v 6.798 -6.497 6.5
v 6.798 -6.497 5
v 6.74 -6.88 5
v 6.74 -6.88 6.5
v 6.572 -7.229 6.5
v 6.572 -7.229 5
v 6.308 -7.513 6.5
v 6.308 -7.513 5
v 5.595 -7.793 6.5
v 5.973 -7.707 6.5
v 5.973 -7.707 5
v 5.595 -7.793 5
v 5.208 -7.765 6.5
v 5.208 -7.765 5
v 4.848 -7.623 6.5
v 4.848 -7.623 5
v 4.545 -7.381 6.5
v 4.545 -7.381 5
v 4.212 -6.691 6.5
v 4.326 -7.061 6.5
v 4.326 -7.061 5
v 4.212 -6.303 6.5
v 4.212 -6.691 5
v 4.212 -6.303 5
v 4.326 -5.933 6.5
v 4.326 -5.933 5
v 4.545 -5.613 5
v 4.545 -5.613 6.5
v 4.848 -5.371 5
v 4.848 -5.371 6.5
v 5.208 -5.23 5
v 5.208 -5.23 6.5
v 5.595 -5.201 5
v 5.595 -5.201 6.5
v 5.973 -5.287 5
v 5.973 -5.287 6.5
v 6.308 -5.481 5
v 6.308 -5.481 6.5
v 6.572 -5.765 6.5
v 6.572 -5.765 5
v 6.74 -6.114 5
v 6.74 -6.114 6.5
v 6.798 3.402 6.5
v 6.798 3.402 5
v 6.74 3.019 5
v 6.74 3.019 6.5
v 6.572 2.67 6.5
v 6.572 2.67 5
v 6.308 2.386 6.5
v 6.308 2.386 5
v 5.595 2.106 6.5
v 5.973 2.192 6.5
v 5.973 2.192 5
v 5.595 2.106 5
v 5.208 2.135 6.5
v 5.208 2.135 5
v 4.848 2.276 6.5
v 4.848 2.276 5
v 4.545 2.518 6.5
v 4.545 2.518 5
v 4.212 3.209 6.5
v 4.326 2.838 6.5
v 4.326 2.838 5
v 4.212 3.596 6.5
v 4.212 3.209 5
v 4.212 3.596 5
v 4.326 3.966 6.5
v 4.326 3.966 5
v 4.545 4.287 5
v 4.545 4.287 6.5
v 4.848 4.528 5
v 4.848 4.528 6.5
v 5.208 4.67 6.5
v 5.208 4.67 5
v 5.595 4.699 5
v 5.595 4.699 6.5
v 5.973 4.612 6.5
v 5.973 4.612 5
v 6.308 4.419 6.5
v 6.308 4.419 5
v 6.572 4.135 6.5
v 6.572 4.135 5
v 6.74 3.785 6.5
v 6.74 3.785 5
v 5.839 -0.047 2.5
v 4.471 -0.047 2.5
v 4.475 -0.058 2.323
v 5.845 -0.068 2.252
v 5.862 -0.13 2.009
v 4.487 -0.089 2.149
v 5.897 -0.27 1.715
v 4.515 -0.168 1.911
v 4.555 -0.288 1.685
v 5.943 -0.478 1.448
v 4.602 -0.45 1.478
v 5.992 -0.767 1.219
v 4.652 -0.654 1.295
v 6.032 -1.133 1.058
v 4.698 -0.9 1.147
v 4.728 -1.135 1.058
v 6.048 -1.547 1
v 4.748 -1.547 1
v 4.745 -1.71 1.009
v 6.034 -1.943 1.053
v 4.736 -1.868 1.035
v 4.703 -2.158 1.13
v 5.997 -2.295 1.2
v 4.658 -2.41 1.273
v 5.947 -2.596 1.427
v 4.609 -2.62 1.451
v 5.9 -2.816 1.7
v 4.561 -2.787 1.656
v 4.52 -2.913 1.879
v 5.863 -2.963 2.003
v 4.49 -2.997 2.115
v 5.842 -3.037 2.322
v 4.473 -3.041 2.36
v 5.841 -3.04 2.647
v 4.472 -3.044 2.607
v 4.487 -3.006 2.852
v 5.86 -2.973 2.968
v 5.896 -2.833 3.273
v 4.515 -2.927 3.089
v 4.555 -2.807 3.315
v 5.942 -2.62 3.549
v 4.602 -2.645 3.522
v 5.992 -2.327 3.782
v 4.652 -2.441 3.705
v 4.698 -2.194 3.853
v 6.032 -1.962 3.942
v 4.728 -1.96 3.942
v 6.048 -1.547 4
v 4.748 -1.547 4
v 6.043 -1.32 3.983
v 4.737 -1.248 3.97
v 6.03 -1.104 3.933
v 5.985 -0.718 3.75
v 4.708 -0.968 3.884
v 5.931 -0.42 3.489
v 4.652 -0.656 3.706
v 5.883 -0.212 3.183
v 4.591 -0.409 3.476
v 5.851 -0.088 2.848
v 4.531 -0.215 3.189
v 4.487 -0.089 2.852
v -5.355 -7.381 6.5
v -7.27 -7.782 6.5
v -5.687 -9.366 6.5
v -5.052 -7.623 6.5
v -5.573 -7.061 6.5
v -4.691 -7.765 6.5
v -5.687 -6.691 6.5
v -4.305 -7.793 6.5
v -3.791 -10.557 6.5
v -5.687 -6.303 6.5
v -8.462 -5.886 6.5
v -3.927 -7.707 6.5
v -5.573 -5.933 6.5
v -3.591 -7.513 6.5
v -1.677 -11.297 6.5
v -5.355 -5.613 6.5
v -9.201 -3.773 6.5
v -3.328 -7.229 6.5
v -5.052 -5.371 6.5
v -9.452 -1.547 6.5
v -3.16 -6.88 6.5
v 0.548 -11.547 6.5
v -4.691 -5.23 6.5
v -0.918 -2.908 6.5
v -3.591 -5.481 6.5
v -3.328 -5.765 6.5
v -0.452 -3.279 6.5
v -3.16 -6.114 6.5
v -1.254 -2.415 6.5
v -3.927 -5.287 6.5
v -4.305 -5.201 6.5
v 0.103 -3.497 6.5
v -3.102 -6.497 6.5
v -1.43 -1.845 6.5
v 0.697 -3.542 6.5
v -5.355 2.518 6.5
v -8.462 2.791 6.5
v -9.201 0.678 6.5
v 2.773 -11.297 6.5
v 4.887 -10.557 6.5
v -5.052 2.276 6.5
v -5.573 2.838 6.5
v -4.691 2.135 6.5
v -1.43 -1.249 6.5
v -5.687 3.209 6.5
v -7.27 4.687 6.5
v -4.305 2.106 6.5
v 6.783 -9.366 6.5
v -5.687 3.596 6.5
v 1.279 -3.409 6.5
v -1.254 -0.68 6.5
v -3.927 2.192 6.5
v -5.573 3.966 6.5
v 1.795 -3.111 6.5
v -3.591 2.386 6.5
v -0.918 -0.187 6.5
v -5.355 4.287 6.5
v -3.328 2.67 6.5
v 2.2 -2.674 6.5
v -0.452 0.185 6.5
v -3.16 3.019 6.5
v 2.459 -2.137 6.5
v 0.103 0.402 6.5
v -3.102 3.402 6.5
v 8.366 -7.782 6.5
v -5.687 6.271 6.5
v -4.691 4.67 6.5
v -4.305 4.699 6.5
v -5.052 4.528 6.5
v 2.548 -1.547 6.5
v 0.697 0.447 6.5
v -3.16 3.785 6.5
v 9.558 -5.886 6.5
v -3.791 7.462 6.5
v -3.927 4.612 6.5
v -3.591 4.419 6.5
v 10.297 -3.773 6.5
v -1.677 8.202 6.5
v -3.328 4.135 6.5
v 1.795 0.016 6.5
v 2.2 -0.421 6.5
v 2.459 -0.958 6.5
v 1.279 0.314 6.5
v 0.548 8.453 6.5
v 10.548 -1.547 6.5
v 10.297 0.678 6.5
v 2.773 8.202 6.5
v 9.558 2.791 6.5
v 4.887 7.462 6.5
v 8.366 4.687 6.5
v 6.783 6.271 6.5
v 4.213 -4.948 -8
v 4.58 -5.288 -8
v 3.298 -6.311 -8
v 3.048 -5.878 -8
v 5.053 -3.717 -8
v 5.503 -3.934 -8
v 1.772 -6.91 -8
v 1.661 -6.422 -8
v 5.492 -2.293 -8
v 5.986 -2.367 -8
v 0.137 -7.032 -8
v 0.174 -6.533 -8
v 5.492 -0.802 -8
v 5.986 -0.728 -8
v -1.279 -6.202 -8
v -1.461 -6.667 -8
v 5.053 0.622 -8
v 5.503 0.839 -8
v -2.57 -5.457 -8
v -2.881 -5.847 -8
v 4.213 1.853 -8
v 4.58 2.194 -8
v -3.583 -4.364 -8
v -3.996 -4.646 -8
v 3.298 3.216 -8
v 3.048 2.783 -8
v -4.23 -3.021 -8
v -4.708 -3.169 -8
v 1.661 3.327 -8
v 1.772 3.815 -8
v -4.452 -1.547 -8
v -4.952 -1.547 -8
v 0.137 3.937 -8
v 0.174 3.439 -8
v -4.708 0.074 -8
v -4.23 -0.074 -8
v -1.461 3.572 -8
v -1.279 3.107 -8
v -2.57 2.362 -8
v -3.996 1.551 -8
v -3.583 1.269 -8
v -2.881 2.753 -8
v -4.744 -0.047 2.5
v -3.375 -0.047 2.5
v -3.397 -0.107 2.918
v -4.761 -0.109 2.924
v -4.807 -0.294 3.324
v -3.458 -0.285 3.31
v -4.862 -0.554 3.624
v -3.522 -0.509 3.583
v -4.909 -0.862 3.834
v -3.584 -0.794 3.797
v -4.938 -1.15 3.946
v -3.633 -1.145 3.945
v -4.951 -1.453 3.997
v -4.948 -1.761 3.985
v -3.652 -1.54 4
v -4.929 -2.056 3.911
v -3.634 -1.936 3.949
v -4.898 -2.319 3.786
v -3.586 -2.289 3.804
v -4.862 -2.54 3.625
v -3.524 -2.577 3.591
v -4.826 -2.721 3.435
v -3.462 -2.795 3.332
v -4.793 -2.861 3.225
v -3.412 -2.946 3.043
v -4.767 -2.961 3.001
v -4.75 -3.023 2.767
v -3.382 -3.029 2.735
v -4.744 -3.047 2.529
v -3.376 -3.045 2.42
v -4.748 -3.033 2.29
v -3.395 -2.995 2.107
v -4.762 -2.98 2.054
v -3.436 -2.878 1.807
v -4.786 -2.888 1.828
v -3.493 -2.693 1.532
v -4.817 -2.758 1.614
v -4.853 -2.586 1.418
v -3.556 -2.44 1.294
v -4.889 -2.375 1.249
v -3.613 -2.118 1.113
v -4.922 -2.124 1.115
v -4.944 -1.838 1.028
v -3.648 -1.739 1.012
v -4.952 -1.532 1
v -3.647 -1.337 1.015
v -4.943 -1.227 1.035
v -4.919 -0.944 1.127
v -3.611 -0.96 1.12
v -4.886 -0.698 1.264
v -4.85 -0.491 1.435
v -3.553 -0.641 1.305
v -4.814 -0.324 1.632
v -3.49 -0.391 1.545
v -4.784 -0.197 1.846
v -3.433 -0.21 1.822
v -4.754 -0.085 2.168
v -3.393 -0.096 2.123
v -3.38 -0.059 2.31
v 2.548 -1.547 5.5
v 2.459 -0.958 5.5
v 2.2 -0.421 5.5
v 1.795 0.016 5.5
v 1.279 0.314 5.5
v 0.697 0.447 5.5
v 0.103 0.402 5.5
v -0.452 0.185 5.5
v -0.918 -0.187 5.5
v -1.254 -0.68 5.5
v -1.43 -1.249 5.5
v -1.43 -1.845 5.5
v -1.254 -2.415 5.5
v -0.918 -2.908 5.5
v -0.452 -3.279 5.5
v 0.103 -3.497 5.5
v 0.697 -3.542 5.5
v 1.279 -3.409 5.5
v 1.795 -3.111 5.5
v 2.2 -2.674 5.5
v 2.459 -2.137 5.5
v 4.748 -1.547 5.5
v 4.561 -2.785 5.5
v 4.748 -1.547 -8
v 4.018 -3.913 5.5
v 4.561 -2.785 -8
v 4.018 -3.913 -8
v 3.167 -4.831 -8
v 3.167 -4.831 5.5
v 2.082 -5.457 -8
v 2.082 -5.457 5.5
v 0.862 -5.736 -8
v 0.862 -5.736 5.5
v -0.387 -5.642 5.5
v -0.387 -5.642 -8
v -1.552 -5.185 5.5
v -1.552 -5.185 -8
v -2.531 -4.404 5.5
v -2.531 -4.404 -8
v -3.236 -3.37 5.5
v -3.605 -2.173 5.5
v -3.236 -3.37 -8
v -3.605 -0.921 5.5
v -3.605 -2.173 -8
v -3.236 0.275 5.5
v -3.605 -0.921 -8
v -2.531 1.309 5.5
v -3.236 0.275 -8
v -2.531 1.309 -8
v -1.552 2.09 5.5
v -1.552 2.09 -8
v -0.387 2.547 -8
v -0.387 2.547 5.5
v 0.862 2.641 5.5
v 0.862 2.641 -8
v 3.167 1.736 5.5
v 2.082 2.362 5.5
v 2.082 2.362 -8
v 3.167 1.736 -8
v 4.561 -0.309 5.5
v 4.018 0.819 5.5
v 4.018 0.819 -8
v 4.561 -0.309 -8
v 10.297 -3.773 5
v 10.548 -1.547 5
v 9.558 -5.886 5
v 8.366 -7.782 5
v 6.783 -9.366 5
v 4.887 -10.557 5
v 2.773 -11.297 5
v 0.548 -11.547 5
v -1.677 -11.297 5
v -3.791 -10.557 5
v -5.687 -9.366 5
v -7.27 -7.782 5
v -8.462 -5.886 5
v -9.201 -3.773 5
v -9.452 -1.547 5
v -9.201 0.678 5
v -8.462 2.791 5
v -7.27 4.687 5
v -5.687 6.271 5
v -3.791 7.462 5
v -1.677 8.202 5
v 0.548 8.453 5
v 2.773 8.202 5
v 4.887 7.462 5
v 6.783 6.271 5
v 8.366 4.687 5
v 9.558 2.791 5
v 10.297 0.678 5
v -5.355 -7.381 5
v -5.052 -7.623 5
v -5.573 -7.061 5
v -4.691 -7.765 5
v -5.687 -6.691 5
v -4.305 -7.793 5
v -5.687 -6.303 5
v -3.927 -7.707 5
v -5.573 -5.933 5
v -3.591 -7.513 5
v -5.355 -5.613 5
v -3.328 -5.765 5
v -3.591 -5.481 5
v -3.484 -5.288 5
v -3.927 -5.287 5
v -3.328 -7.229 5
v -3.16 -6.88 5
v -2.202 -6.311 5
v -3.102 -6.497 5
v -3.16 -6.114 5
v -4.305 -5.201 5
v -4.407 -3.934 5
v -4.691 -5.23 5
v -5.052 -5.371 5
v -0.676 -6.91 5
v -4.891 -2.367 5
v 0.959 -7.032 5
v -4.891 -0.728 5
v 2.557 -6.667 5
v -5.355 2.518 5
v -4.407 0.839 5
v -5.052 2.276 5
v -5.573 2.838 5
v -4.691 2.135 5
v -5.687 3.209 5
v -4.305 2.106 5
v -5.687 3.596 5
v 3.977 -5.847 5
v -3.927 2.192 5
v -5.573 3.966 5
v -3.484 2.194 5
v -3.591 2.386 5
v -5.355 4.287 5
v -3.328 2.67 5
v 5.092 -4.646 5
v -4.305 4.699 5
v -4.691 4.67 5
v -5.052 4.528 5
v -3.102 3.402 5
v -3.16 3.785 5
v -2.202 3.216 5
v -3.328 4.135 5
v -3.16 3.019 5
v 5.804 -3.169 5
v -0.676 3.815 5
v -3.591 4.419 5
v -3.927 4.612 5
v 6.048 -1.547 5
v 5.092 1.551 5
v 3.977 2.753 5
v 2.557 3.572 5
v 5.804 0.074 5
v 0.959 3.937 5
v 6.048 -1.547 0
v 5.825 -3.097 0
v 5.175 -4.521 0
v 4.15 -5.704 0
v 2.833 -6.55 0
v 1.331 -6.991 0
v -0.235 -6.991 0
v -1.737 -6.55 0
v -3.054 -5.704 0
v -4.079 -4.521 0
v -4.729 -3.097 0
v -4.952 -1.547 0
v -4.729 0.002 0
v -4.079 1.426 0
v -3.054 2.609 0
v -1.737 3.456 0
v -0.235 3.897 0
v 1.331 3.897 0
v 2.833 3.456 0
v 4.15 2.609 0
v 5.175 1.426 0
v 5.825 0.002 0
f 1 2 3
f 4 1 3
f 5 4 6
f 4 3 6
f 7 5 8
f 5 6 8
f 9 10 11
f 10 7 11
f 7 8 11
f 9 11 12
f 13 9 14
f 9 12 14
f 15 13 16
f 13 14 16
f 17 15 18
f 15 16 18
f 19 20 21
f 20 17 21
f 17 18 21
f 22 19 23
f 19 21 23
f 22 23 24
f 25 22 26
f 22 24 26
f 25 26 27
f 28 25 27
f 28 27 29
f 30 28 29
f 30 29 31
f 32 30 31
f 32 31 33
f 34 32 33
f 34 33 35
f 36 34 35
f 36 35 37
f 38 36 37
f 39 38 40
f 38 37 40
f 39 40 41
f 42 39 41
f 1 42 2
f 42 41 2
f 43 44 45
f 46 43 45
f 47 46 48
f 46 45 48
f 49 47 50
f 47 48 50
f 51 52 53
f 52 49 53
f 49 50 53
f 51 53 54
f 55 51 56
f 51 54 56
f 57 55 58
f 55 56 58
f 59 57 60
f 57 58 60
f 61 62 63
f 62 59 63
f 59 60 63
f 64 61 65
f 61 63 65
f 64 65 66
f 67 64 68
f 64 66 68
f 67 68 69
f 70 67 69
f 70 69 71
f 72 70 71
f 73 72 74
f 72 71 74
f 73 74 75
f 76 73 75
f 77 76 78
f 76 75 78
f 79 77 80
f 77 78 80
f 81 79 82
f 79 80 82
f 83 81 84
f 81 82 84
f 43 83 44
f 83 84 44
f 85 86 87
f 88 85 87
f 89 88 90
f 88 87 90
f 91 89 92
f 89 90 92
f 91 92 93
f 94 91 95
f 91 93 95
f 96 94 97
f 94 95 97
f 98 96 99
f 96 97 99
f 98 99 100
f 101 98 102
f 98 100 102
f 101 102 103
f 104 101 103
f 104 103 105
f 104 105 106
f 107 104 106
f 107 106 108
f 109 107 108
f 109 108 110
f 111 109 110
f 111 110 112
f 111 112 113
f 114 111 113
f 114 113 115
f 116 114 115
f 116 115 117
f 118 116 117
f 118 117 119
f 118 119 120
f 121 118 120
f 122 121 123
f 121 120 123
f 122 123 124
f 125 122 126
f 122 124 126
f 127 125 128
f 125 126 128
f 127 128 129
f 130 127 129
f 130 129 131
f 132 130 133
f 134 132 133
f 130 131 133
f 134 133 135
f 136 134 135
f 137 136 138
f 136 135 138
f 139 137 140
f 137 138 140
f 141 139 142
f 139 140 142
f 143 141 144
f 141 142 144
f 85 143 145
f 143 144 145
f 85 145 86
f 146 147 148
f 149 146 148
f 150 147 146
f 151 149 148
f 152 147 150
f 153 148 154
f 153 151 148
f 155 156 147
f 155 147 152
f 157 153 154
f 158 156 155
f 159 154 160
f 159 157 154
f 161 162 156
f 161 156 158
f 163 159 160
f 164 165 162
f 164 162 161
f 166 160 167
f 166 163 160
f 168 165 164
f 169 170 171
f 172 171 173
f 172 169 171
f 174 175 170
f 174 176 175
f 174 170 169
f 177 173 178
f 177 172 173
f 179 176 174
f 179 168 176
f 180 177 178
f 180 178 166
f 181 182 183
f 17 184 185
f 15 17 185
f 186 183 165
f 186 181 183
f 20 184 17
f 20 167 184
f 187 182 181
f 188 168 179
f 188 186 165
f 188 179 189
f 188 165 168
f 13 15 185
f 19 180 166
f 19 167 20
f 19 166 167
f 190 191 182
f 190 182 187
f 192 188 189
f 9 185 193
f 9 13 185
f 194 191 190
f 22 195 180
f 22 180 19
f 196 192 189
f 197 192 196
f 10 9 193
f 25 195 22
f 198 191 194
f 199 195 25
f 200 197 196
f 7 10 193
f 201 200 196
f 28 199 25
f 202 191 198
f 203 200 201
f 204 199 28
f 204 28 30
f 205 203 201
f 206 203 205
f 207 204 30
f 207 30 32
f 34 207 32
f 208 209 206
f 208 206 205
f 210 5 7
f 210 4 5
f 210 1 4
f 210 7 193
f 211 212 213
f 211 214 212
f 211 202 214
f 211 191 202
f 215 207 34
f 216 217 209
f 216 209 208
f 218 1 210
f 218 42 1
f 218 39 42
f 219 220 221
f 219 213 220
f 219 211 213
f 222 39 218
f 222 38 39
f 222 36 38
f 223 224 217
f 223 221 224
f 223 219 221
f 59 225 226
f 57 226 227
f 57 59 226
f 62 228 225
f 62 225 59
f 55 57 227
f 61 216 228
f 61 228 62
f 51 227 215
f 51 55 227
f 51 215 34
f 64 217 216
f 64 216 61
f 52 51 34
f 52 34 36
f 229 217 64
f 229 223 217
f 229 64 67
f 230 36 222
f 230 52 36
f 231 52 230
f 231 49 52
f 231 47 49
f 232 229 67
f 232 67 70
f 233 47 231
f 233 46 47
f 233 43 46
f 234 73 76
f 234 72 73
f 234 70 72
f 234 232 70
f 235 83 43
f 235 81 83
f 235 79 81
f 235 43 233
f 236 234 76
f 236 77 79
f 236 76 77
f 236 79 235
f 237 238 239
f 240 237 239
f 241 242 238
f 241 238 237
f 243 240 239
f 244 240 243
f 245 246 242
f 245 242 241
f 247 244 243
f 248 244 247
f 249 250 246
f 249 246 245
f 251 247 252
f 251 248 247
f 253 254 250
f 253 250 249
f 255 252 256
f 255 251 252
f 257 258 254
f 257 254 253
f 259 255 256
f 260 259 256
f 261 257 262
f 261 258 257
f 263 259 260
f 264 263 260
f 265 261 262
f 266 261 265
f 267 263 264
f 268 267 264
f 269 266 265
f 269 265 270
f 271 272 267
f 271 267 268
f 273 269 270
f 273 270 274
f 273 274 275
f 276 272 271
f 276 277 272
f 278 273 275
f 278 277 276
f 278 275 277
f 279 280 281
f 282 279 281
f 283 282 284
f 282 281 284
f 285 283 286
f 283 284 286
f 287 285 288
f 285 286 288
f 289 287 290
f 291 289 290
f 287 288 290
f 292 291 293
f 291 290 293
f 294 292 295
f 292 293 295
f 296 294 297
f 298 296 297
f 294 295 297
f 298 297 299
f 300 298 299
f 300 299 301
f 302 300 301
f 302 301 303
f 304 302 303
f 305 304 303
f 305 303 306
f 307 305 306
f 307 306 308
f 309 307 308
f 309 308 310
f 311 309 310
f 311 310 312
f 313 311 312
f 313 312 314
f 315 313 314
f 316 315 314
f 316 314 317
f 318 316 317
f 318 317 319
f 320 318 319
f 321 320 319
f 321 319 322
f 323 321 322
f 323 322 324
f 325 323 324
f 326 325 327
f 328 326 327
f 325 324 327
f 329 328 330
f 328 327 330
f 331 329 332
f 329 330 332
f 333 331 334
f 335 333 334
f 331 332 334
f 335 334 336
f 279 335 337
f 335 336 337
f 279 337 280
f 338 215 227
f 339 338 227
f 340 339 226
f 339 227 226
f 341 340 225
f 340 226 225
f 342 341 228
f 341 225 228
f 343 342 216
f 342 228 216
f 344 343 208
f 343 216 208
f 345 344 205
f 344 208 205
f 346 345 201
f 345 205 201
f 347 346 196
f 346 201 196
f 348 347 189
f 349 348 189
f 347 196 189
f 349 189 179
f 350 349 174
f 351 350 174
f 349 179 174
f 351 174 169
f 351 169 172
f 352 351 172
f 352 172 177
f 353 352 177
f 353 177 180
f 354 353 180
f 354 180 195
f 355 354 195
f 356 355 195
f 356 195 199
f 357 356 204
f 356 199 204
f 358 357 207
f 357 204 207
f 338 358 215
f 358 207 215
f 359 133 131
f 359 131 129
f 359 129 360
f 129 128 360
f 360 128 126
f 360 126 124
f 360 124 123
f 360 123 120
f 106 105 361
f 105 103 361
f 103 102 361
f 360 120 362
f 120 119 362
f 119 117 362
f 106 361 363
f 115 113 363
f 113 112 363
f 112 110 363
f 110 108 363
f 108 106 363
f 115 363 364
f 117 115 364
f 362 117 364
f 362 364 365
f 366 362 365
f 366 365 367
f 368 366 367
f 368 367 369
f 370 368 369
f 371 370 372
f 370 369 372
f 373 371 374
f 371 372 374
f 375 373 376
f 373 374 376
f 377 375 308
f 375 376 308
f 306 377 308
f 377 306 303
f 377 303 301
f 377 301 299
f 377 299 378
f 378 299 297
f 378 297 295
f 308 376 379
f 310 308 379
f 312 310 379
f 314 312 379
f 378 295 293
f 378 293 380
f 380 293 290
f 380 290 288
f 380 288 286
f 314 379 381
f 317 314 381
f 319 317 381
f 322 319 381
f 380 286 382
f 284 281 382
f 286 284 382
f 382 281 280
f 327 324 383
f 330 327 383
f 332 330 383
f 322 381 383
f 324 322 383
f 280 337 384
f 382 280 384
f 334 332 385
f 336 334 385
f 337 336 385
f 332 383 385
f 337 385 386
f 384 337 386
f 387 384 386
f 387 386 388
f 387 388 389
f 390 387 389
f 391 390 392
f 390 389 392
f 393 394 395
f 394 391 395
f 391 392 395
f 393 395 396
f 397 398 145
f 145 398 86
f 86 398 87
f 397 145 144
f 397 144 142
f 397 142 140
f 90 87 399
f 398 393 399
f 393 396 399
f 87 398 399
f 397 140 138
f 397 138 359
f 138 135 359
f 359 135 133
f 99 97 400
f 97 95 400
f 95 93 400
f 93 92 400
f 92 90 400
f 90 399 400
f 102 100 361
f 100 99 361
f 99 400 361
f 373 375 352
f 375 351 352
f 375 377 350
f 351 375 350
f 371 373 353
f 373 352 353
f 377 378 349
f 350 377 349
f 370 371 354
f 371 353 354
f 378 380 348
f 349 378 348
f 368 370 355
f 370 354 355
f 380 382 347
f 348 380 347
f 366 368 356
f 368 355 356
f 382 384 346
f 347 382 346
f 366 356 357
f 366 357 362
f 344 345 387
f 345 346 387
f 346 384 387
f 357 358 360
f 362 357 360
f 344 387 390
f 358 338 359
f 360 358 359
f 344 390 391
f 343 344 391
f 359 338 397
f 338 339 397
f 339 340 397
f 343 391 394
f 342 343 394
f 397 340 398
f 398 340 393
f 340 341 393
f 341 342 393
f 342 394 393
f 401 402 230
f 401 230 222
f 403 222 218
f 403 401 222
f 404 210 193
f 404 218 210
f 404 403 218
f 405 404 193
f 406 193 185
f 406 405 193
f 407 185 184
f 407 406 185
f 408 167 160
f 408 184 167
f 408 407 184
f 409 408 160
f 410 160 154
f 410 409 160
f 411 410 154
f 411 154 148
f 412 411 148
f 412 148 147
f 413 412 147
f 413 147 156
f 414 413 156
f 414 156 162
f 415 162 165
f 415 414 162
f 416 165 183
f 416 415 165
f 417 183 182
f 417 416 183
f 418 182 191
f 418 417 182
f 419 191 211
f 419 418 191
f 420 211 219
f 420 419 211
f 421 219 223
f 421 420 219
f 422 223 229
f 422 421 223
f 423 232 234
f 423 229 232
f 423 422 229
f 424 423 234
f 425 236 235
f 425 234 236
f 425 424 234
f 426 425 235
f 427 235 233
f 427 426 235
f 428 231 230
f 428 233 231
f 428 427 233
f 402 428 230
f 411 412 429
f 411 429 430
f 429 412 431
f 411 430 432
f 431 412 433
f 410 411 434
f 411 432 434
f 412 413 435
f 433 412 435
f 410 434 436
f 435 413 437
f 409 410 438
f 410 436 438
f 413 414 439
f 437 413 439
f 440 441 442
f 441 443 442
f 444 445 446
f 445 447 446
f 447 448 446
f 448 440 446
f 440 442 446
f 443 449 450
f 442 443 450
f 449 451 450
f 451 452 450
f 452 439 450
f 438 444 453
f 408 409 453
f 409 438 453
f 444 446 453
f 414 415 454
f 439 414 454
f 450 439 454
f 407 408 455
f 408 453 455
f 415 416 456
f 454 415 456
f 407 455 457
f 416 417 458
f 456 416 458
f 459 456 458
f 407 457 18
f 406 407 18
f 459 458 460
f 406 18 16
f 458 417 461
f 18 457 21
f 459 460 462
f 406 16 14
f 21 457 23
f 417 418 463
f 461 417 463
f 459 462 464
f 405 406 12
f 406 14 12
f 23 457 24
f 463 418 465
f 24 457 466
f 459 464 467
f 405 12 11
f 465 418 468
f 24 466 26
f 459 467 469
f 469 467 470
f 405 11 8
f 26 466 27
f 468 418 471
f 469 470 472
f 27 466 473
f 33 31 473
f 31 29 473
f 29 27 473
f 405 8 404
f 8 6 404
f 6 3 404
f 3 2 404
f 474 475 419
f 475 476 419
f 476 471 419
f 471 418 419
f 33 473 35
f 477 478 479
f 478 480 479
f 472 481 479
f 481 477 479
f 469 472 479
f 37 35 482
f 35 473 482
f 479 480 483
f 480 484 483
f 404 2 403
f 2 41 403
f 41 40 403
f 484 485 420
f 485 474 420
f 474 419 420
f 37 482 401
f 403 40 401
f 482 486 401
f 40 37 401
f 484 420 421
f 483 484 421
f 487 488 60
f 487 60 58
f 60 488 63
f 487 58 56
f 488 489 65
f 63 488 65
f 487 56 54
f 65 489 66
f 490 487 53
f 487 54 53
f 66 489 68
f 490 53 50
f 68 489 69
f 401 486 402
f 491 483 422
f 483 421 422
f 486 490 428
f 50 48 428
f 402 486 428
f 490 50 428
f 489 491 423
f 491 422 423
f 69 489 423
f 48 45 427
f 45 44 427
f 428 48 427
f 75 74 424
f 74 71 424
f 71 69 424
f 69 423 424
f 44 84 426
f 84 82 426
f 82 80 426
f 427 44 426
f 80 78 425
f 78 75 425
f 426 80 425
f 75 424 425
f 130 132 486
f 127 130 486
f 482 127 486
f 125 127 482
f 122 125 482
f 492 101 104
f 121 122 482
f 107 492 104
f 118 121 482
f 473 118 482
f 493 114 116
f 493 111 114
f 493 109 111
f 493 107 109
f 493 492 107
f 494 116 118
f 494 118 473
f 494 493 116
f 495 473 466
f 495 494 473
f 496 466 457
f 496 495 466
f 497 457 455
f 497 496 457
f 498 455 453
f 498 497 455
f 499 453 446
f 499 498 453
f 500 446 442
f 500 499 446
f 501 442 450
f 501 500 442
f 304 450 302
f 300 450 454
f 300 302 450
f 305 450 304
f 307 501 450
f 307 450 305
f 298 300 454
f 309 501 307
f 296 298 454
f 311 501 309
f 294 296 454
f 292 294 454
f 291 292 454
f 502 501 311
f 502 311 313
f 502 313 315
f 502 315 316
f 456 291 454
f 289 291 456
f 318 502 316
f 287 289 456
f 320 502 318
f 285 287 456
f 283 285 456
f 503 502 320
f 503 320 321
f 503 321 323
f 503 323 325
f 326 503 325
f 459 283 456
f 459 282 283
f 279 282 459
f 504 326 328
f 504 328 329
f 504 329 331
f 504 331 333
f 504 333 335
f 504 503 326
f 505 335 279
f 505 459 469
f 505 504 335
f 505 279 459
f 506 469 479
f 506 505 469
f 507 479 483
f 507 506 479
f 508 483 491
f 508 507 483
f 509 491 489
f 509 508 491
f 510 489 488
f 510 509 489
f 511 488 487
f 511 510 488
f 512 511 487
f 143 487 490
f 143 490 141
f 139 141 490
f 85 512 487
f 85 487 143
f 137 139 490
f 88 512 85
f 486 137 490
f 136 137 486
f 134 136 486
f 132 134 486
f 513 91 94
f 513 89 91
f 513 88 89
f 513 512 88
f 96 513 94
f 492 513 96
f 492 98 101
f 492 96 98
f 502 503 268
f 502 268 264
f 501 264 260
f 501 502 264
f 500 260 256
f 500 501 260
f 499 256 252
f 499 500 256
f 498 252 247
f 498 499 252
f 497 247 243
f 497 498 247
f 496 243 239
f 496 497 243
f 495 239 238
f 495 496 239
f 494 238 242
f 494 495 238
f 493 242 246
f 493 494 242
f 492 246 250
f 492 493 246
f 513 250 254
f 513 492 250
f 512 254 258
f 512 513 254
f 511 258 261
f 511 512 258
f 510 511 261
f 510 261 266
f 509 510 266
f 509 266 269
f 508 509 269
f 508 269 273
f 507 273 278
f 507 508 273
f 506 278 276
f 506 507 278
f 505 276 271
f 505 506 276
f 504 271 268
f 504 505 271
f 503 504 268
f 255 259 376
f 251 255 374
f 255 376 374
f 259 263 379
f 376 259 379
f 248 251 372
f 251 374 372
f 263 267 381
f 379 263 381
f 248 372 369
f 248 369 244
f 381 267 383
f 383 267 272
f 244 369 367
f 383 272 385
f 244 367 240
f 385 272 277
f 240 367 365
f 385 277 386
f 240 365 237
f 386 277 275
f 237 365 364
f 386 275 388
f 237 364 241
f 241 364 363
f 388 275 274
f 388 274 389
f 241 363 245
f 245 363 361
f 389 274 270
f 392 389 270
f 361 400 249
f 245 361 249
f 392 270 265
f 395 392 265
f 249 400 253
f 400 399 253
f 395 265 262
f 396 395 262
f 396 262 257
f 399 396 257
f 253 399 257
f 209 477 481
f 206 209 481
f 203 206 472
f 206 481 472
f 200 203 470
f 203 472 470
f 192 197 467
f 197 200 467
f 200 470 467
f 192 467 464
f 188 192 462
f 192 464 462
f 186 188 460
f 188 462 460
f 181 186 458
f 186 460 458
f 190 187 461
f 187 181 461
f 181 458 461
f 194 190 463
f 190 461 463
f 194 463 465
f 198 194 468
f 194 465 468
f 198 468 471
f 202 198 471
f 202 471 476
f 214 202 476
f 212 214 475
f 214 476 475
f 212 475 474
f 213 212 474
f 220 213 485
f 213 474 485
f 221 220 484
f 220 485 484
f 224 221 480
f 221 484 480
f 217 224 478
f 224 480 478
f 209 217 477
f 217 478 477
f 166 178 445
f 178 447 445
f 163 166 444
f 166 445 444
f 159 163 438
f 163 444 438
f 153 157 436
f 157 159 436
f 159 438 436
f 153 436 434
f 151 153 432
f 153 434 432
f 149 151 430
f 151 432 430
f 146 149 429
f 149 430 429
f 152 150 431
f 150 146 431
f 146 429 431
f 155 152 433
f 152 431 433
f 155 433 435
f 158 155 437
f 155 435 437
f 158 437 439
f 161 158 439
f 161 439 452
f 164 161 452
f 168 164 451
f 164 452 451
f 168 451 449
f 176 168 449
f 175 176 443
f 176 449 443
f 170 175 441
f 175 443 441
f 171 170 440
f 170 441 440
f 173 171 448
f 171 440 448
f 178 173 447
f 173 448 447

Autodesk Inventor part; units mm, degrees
ref_plane "YZ Plane" through (0, 0, 0) normal (1, 0, 0) x (0, 1, 0)
ref_plane "XZ Plane" through (0, 0, 0) normal (0, 1, 0) x (-1, 0, 0)
ref_plane "XY Plane" through (0, 0, 0) normal (0, 0, 1) x (1, 0, 0)
sketch "스케치1" plane through (0, 0, 0) normal (0, 0, 1) x (1, 0, 0)
  circle A0 centre (0.5479, -1.5474) radius 5.5
  circle A1 centre (0.5479, -1.5474) radius 5
  circle A2 centre (0.5479, -1.5474) radius 4.2
  ellipse E0 centre (0.5479, -1.5474) end of major axis (-0.0909, -9.0201) minor radius 7.4992
  ellipse E1 centre (0.5479, -1.5474) end of major axis (-0.0912, -9.0201) minor radius 7.4991
  ellipse E2 centre (0.5479, -1.5474) end of major axis (1.2999, 2.3813) minor radius 3.9993 (-3.4513, -1.5143) -> (4.5471, -1.5804) ccw projected
  dimension "d0" = 10
  dimension "d1" = 8.4
  dimension "d24" = 11
extrude "돌출1" add sketch "스케치1" against normal blind 8 contours A1
sketch "스케치2" plane through (0.5479, -1.5474, 0) normal (0, 0, 1) x (1, 0, 0)
  circle A0 centre (0, 0) radius 4.2 projected
  circle A1 centre (0, 0) radius 5.5
  dimension "d4" = 11
extrude "돌출2" add sketch "스케치2" along normal blind 5
sketch "스케치3" plane through (0.5479, -1.5474, 5) normal (0, 0, 1) x (1, 0, 0)
  circle A0 centre (0, 0) radius 5.5 projected
  circle A1 centre (0, 0) radius 4.2 projected
  circle A2 centre (0, 0) radius 10
  circle A3 centre (4.9497, -4.9497) radius 1.3
  circle A4 centre (0, 0) radius 5 projected
  line L0 (0, 0) -> (0, -5.5) construction
  circle A5 centre (4.9497, 4.9497) radius 1.3
  circle A6 centre (-4.9497, 4.9497) radius 1.3
  circle A7 centre (-4.9497, -4.9497) radius 1.3
  dimension "d9" = 20
  dimension "d10" = 2.6
  dimension "d11" = 7
  dimension "d12" = 45
  dimension "d15" = 360
extrude "돌출3" add sketch "스케치3" along normal blind 1.5 contours A0 | A2 | A4
sketch "스케치4" plane through (0.5479, -1.5474, 6.5) normal (0, 0, 1) x (1, 0, 0)
  circle A0 centre (0, 0) radius 4.2 projected
  circle A1 centre (0, 0) radius 2
  dimension "d17" = 4
extrude "돌출4" add sketch "스케치4" against normal blind 1
sketch "스케치5" plane through (0, 0, 0) normal (1, 0, 0) x (0, 1, 0)
  circle A0 centre (-1.5474, 2.5) radius 1.5
  line L0 (3.9526, 0) -> (-7.0474, 0) projected
  line L1 (3.9526, 5) -> (-7.0474, 5) projected
  line L2 (3.9526, 0) -> (-7.0474, 0) projected
  line L3 (-7.0474, 0) -> (-7.0474, 5) projected
  line L4 (3.9526, 0) -> (3.9526, 5) projected
  point P0 (0, 0)
  point P1 (-1.5474, 5)
  dimension "d20" = 3
  dimension "d21" = 2.5
extrude "돌출5" cut sketch "스케치5" along normal through all both and the other way through all contours A0
sketch "스케치6" plane through (0.5479, -1.5474, 0) normal (0, 0, -1) x (-1, 0, 0)
  circle A0 centre (0, 0) radius 5.5 projected
  circle A1 centre (0, 0) radius 5 projected
  point P0 (0.5479, 1.5474)
extrude "돌출6" add sketch "스케치6" along normal blind 8
properties part number "motor_clamp" material "고무, 검은색"
